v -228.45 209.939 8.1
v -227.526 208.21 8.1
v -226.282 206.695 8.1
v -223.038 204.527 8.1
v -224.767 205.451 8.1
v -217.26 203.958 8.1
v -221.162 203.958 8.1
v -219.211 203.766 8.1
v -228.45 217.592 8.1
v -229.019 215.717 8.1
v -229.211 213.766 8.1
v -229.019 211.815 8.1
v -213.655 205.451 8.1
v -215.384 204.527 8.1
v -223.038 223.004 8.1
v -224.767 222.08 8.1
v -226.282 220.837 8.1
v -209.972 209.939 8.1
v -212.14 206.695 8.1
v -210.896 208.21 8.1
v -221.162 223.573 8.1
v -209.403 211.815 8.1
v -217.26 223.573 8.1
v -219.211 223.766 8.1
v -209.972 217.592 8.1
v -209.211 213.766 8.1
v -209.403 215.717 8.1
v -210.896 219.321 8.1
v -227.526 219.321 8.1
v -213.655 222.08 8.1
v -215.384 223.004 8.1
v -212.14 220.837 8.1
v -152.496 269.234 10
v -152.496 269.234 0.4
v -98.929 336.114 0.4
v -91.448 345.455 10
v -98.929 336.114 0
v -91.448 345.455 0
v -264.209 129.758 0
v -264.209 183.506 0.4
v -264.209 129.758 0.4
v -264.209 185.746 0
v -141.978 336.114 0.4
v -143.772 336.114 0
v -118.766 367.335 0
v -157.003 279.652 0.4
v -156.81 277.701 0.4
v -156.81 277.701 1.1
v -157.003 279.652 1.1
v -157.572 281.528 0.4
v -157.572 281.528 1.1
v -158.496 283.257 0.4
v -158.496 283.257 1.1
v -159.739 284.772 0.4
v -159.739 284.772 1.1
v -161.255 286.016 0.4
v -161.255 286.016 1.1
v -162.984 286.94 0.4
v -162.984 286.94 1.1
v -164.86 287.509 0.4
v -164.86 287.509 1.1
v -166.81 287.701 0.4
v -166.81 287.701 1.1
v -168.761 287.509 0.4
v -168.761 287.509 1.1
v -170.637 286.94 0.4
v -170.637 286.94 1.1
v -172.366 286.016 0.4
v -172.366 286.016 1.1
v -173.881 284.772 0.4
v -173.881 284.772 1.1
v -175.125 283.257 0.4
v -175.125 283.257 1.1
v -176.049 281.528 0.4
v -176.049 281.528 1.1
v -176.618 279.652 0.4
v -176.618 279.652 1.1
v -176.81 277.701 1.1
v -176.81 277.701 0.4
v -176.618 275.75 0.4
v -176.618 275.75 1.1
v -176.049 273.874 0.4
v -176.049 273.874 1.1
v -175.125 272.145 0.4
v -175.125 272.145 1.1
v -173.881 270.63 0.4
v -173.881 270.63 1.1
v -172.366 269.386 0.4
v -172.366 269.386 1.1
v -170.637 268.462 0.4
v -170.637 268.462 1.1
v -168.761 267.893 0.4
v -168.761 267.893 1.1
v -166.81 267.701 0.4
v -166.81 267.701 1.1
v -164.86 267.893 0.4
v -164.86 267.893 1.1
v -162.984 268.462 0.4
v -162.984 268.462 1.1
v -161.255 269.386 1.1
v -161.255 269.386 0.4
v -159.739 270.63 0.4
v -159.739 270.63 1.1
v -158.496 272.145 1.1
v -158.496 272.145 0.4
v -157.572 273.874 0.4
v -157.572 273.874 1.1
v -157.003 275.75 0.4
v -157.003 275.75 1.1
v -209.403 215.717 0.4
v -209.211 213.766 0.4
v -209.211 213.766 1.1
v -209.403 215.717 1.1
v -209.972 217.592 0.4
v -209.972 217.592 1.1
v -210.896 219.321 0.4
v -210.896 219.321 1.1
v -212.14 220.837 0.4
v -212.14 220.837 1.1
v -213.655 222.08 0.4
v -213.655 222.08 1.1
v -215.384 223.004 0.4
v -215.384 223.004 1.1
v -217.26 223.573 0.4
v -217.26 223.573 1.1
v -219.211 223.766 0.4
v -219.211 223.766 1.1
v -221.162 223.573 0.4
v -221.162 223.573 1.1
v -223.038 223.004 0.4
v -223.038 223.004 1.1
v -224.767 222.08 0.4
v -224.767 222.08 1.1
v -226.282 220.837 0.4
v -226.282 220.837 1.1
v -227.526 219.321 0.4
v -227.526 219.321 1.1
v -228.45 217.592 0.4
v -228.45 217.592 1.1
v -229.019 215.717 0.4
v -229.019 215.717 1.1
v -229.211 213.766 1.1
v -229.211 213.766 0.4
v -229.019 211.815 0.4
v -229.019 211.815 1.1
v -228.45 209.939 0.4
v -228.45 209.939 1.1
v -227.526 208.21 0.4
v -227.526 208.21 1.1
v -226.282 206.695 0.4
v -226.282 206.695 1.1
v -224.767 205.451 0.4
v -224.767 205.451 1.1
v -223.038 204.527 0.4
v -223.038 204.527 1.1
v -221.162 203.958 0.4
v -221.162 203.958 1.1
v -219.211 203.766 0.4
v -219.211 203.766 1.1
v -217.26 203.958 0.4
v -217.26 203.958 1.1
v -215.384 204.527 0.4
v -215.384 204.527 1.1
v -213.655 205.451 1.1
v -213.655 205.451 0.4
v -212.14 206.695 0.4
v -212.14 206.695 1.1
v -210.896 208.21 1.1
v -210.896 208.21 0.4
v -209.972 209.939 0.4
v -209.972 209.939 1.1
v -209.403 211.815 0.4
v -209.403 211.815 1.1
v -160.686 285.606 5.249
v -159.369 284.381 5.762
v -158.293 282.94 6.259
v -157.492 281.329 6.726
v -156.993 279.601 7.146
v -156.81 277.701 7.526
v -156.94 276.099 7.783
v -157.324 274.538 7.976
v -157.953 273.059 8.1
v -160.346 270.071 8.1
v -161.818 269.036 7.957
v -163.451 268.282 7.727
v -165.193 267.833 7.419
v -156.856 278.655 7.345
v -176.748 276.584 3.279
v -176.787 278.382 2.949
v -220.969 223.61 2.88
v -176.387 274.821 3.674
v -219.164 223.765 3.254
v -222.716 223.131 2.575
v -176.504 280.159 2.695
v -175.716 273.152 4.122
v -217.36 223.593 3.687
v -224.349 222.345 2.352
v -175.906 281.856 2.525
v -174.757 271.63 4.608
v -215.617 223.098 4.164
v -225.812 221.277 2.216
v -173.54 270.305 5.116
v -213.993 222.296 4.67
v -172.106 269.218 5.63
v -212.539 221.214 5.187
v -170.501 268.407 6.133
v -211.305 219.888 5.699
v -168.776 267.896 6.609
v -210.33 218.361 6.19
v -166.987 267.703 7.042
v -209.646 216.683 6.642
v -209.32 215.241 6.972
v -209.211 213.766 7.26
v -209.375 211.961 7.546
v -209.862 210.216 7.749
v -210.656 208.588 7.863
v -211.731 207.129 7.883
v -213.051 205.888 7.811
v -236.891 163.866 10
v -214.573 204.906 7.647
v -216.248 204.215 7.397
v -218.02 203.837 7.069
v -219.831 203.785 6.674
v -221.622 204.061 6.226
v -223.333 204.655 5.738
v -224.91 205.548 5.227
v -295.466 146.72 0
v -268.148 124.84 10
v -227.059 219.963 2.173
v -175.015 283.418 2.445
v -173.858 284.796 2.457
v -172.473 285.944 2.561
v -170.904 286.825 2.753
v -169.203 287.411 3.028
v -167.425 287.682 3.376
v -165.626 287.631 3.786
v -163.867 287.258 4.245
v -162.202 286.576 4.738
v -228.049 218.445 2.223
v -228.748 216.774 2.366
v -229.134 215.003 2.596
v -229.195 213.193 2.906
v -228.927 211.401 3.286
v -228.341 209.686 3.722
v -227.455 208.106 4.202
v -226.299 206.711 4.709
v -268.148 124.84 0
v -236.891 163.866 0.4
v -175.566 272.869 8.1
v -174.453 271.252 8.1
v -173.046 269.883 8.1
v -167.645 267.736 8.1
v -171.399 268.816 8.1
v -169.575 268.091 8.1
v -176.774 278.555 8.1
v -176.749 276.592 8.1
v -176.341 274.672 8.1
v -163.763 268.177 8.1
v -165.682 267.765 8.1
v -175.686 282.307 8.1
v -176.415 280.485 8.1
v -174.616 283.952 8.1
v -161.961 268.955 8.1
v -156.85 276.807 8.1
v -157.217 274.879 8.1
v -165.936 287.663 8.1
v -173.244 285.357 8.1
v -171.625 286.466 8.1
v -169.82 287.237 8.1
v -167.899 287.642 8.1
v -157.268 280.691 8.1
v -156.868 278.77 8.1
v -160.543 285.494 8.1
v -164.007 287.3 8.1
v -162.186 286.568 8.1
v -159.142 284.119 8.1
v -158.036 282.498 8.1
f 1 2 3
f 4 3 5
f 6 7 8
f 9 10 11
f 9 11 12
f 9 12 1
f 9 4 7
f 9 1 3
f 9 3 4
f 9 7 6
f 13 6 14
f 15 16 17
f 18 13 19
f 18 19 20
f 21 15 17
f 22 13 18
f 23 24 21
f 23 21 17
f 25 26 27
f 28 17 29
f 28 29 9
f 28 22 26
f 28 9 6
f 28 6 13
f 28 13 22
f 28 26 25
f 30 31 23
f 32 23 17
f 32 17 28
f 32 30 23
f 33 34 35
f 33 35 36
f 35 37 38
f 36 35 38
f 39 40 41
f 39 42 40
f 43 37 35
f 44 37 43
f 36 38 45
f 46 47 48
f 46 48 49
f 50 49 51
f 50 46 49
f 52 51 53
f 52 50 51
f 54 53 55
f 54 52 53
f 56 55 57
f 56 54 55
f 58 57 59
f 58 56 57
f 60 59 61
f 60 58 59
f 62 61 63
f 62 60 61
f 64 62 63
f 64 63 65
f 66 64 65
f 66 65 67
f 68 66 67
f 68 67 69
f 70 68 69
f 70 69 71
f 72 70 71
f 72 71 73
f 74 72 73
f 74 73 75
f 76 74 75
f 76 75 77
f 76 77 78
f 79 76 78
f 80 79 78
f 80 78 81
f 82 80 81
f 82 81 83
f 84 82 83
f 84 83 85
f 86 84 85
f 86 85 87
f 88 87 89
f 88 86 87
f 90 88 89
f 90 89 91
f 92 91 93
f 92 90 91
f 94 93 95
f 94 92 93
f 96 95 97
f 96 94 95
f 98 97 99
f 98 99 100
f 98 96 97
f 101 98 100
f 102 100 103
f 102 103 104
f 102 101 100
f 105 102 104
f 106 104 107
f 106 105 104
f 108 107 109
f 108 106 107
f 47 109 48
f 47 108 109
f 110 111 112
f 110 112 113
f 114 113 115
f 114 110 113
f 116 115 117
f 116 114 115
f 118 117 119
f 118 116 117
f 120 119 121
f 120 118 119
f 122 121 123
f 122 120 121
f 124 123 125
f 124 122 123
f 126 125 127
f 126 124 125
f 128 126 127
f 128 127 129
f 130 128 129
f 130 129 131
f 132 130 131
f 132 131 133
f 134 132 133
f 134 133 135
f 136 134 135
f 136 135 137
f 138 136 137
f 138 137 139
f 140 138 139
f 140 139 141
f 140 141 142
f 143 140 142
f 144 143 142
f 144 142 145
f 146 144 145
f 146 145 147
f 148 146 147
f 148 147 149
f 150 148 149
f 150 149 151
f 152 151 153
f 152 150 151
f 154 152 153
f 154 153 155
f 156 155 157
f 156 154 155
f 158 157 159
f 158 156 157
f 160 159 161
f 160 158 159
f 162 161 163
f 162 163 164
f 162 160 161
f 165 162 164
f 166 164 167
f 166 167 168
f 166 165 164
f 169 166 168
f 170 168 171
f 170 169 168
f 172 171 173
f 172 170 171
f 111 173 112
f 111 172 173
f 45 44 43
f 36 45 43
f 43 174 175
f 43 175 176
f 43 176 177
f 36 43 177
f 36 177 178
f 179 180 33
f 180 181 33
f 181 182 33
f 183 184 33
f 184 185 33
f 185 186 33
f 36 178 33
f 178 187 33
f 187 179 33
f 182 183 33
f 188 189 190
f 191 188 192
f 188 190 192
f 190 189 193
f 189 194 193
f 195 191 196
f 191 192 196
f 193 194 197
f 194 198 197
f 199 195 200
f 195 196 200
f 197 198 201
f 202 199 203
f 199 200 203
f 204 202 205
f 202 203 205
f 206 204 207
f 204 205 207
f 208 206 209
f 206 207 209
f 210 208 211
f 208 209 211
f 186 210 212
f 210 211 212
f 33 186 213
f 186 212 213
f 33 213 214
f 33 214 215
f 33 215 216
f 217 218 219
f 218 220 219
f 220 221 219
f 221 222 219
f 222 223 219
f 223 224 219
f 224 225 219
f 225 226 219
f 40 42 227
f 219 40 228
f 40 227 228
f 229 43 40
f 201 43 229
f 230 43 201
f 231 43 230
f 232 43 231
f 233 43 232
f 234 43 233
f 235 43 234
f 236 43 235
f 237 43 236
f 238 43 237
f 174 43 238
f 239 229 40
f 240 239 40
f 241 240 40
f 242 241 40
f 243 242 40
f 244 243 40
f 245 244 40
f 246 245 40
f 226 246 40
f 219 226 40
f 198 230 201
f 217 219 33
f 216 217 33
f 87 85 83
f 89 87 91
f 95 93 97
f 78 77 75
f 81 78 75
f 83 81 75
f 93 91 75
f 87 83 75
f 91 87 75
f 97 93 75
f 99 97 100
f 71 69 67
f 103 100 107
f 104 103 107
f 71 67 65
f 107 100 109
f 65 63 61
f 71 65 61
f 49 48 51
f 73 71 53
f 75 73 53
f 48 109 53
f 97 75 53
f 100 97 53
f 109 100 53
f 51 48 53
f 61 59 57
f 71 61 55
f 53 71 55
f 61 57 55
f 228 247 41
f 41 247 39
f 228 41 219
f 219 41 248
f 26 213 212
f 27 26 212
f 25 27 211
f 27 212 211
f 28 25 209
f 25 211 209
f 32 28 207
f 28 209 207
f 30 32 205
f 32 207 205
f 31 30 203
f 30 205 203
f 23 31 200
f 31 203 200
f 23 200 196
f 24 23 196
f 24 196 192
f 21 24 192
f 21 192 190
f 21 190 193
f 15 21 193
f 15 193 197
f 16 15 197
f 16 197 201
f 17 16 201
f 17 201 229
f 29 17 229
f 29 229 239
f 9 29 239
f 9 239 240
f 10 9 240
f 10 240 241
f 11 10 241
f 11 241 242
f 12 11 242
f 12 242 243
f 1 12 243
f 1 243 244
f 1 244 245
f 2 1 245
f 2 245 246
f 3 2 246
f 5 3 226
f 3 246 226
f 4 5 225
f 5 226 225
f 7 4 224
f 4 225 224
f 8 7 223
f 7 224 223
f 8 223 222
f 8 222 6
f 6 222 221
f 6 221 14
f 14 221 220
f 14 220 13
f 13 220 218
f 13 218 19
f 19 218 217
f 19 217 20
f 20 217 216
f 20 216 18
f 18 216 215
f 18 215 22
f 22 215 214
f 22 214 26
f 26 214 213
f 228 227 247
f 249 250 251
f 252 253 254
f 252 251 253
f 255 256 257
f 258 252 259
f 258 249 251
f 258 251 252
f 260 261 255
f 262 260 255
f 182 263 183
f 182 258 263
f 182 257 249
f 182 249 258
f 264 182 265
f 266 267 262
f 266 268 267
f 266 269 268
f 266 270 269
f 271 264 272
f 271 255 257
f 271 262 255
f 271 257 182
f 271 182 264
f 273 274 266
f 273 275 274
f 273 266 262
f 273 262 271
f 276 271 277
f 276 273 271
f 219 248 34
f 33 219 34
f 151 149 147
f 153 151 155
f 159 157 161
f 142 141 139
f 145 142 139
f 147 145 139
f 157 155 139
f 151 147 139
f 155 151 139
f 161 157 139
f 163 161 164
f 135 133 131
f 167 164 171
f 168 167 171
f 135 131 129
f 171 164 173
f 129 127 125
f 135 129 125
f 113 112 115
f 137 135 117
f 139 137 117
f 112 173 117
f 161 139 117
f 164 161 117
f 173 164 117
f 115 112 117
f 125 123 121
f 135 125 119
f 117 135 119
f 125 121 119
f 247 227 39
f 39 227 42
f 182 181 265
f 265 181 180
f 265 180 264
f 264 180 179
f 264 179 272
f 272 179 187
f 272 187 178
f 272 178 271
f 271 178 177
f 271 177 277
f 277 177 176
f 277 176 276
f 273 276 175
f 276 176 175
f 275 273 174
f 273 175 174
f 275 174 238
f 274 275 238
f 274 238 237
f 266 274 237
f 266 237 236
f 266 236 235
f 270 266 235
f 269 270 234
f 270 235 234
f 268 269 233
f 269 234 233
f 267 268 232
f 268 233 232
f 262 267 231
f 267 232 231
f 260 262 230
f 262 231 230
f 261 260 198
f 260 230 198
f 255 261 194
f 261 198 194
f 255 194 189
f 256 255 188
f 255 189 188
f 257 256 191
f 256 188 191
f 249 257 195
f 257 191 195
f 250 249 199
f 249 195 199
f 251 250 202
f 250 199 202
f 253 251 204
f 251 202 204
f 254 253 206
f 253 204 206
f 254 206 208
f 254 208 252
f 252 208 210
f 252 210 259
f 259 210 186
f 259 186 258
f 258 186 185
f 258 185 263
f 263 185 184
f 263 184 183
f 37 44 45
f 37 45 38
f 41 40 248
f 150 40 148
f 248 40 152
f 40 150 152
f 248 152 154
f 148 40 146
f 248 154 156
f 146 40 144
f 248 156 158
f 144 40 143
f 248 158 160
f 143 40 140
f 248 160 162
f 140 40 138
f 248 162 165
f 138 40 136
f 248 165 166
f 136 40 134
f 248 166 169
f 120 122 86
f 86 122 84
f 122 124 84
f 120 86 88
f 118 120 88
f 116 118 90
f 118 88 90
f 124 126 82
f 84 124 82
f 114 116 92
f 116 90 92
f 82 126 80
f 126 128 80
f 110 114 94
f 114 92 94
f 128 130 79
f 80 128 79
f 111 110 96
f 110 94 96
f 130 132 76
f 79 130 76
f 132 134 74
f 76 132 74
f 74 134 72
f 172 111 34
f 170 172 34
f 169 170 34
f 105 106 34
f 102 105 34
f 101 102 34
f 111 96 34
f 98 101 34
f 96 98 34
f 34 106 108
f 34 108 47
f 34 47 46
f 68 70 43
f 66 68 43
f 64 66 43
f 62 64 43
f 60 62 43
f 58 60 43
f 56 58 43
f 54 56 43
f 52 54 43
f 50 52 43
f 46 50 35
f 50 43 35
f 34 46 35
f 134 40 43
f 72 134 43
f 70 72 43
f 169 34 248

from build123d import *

# Parameters (mm, degrees)
F1_DEPTH = 10
F2_DEPTH = 0.4
F4_DEPTH = 319.7
F5_R     = 10
F6_DEPTH = 8.1
F7_DEPTH = 1.1


with BuildPart() as f1:
    # F0 (on Top) → F1 (new body)
    with BuildSketch(Plane.XY):
        Polygon((-118.766080561, 367.3347540892), (-143.7718247791, 336.1143640196), (-98.9293357238, 336.1143640196), (-91.4482392501, 345.4547278984), align=None)
        Polygon((-98.9293357238, 336.1143640196), (-143.7718247791, 336.1143640196), (-179.8142472891, 291.1143640196), (-152.4964059782, 269.2343378288), align=None)
        Polygon((-152.4964059782, 269.2343378288), (-179.8142472891, 291.1143640196), (-236.384913462, 220.4842620314), (-209.0670721511, 198.6042358405), align=None)
        Polygon((-264.2086340252, 129.7584116274), (-264.2086340252, 185.7455475346), (-295.4658142978, 146.7200599476), (-268.1479729869, 124.8400337568), align=None)
        Polygon((-236.8907927142, 163.8655213438), (-264.2086340252, 185.7455475346), (-264.2086340252, 129.7584116274), align=None)
        Polygon((-236.384913462, 220.4842620314), (-264.2086340252, 185.7455475346), (-236.8907927142, 163.8655213438), (-209.0670721511, 198.6042358405), align=None)
    extrude(amount=F1_DEPTH)

    # F0 (on Top) + F1_face (on face) → F2 (cut)
    with BuildSketch(Plane.XY):
        Polygon((-98.9293357238, 336.1143640196), (-143.7718247791, 336.1143640196), (-179.8142472891, 291.1143640196), (-152.4964059782, 269.2343378288), align=None)
        Polygon((-152.4964059782, 269.2343378288), (-179.8142472891, 291.1143640196), (-236.384913462, 220.4842620314), (-209.0670721511, 198.6042358405), align=None)
        Polygon((-236.8907927142, 163.8655213438), (-264.2086340252, 185.7455475346), (-264.2086340252, 129.7584116274), align=None)
        Polygon((-236.384913462, 220.4842620314), (-264.2086340252, 185.7455475346), (-236.8907927142, 163.8655213438), (-209.0670721511, 198.6042358405), align=None)
    with BuildSketch(Plane(origin=(-193.4570267739, 246.087393923, 10), x_dir=(1, 0, 0), z_dir=(0, 0, 1))):
        Polygon((74.6909462129, 121.2473601662), (-102.0087875238, -99.3673339754), (-74.6909462129, -121.2473601662), (102.0087875238, 99.3673339754), align=None)
    extrude(amount=F2_DEPTH, mode=Mode.SUBTRACT)

    # F3 (on face) → F4 (cut)
    with BuildSketch(Plane(origin=(-43.8801592677, -54.7856395198, 0), x_dir=(0.7805097517, -0.6251436055, 0), z_dir=(-0.6251436055, -0.7805097517, 0))):
        Polygon((-322.3350566332, 0), (-287.3350566332, 10), (-322.3350566332, 10), align=None)
        Polygon((-287.3350566332, 10), (-290.9218451271, 22.5537597288), (-325.9218451271, 12.5537597288), (-322.3350566332, 0), (-322.3350566332, 10), align=None)
    extrude(amount=-F4_DEPTH, mode=Mode.SUBTRACT)

    # F5 (on Top) → F6 (join)
    with BuildSketch(Plane.XY):
        with Locations((-219.2109416958, 213.7656019243)):
            Circle(F5_R)
        with Locations((-166.8104226756, 277.7009841669)):
            Circle(F5_R)
    extrude(amount=F6_DEPTH)

    # F5 (on Top) → F7 (cut)
    with BuildSketch(Plane.XY):
        with Locations((-219.2109416958, 213.7656019243)):
            Circle(F5_R)
        with Locations((-166.8104226756, 277.7009841669)):
            Circle(F5_R)
    extrude(amount=F7_DEPTH, mode=Mode.SUBTRACT)


solid = f1.part
